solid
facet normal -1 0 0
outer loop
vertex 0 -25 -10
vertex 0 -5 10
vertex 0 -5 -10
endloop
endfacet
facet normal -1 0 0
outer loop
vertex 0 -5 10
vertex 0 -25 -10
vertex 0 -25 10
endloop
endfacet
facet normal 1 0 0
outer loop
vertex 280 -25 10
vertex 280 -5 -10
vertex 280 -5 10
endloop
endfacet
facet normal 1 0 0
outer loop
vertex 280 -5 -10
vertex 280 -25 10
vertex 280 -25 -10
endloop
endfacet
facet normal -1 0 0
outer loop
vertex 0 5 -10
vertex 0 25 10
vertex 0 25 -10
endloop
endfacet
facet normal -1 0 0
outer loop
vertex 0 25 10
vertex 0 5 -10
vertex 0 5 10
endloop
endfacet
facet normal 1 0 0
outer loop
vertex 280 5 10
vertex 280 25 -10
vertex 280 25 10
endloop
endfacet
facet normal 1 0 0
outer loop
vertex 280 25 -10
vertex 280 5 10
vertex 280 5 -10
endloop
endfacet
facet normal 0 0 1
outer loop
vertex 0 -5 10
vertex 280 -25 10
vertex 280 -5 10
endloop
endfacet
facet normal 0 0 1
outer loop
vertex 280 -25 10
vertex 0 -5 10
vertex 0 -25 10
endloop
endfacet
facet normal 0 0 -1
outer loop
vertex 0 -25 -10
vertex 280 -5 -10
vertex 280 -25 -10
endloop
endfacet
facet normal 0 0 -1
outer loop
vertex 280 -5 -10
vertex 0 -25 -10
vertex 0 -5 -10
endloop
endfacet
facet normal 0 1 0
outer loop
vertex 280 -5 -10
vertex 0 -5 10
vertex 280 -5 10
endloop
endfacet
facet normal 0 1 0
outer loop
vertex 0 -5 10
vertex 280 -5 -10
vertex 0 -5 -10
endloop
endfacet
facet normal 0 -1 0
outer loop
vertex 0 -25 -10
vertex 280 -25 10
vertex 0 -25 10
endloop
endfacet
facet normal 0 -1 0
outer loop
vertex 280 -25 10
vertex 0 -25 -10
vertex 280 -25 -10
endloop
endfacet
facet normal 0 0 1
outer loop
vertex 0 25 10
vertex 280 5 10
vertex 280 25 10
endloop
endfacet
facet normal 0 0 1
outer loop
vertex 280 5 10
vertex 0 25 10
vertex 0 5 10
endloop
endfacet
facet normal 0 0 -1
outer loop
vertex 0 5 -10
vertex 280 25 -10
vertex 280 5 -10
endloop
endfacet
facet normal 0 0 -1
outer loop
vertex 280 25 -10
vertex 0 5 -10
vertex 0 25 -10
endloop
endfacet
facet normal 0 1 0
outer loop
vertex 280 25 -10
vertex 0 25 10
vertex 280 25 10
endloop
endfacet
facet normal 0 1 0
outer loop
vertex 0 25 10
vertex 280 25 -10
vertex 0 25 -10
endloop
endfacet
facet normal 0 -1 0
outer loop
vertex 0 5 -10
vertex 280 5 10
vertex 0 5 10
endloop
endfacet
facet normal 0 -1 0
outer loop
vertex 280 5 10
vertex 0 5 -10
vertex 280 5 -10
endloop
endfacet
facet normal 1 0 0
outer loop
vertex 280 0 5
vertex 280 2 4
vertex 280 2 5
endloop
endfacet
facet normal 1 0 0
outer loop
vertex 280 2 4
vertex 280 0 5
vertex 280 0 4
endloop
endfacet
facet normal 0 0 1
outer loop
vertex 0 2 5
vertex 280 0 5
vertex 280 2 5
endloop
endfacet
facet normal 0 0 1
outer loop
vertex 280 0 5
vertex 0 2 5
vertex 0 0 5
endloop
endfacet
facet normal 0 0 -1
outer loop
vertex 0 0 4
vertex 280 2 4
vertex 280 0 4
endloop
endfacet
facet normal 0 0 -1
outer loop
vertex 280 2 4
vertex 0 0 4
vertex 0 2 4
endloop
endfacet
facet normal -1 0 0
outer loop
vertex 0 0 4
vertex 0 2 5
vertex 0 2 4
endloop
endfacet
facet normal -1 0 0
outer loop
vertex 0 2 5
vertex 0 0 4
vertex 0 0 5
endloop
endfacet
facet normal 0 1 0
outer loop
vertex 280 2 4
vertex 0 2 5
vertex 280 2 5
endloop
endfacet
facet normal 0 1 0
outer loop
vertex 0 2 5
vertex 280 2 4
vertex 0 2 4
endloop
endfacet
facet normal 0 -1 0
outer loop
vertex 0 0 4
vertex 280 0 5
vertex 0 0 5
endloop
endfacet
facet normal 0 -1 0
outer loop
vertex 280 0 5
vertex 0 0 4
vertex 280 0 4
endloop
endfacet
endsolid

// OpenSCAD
module assembly_preview() {
  rod_d = 8.0;
  rod_spacing = 40.0;
  rod_len = 280.0;
  
  module rods(){
    color([0.7,0.7,0.7]) {
      translate([0, -rod_spacing/2, 0]) rotate([0,90,0]) cylinder(h=rod_len, d=rod_d, center=false);
      translate([0,  rod_spacing/2, 0]) rotate([0,90,0]) cylinder(h=rod_len, d=rod_d, center=false);
    }
  }
  rods();
  color([0.3,0.3,0.3]) translate([0, -25, -10]) cube([rod_len, 20, 20], center=false);
  color([0.3,0.3,0.3]) translate([0,  5, -10]) cube([rod_len, 20, 20], center=false);
  color([0.1,0.1,0.1]) translate([0,0,rod_d/2]) cube([rod_len, 2, 1], center=false);
  // Import and position printable parts manually if you want a full assembly preview.
}
assembly_preview();
